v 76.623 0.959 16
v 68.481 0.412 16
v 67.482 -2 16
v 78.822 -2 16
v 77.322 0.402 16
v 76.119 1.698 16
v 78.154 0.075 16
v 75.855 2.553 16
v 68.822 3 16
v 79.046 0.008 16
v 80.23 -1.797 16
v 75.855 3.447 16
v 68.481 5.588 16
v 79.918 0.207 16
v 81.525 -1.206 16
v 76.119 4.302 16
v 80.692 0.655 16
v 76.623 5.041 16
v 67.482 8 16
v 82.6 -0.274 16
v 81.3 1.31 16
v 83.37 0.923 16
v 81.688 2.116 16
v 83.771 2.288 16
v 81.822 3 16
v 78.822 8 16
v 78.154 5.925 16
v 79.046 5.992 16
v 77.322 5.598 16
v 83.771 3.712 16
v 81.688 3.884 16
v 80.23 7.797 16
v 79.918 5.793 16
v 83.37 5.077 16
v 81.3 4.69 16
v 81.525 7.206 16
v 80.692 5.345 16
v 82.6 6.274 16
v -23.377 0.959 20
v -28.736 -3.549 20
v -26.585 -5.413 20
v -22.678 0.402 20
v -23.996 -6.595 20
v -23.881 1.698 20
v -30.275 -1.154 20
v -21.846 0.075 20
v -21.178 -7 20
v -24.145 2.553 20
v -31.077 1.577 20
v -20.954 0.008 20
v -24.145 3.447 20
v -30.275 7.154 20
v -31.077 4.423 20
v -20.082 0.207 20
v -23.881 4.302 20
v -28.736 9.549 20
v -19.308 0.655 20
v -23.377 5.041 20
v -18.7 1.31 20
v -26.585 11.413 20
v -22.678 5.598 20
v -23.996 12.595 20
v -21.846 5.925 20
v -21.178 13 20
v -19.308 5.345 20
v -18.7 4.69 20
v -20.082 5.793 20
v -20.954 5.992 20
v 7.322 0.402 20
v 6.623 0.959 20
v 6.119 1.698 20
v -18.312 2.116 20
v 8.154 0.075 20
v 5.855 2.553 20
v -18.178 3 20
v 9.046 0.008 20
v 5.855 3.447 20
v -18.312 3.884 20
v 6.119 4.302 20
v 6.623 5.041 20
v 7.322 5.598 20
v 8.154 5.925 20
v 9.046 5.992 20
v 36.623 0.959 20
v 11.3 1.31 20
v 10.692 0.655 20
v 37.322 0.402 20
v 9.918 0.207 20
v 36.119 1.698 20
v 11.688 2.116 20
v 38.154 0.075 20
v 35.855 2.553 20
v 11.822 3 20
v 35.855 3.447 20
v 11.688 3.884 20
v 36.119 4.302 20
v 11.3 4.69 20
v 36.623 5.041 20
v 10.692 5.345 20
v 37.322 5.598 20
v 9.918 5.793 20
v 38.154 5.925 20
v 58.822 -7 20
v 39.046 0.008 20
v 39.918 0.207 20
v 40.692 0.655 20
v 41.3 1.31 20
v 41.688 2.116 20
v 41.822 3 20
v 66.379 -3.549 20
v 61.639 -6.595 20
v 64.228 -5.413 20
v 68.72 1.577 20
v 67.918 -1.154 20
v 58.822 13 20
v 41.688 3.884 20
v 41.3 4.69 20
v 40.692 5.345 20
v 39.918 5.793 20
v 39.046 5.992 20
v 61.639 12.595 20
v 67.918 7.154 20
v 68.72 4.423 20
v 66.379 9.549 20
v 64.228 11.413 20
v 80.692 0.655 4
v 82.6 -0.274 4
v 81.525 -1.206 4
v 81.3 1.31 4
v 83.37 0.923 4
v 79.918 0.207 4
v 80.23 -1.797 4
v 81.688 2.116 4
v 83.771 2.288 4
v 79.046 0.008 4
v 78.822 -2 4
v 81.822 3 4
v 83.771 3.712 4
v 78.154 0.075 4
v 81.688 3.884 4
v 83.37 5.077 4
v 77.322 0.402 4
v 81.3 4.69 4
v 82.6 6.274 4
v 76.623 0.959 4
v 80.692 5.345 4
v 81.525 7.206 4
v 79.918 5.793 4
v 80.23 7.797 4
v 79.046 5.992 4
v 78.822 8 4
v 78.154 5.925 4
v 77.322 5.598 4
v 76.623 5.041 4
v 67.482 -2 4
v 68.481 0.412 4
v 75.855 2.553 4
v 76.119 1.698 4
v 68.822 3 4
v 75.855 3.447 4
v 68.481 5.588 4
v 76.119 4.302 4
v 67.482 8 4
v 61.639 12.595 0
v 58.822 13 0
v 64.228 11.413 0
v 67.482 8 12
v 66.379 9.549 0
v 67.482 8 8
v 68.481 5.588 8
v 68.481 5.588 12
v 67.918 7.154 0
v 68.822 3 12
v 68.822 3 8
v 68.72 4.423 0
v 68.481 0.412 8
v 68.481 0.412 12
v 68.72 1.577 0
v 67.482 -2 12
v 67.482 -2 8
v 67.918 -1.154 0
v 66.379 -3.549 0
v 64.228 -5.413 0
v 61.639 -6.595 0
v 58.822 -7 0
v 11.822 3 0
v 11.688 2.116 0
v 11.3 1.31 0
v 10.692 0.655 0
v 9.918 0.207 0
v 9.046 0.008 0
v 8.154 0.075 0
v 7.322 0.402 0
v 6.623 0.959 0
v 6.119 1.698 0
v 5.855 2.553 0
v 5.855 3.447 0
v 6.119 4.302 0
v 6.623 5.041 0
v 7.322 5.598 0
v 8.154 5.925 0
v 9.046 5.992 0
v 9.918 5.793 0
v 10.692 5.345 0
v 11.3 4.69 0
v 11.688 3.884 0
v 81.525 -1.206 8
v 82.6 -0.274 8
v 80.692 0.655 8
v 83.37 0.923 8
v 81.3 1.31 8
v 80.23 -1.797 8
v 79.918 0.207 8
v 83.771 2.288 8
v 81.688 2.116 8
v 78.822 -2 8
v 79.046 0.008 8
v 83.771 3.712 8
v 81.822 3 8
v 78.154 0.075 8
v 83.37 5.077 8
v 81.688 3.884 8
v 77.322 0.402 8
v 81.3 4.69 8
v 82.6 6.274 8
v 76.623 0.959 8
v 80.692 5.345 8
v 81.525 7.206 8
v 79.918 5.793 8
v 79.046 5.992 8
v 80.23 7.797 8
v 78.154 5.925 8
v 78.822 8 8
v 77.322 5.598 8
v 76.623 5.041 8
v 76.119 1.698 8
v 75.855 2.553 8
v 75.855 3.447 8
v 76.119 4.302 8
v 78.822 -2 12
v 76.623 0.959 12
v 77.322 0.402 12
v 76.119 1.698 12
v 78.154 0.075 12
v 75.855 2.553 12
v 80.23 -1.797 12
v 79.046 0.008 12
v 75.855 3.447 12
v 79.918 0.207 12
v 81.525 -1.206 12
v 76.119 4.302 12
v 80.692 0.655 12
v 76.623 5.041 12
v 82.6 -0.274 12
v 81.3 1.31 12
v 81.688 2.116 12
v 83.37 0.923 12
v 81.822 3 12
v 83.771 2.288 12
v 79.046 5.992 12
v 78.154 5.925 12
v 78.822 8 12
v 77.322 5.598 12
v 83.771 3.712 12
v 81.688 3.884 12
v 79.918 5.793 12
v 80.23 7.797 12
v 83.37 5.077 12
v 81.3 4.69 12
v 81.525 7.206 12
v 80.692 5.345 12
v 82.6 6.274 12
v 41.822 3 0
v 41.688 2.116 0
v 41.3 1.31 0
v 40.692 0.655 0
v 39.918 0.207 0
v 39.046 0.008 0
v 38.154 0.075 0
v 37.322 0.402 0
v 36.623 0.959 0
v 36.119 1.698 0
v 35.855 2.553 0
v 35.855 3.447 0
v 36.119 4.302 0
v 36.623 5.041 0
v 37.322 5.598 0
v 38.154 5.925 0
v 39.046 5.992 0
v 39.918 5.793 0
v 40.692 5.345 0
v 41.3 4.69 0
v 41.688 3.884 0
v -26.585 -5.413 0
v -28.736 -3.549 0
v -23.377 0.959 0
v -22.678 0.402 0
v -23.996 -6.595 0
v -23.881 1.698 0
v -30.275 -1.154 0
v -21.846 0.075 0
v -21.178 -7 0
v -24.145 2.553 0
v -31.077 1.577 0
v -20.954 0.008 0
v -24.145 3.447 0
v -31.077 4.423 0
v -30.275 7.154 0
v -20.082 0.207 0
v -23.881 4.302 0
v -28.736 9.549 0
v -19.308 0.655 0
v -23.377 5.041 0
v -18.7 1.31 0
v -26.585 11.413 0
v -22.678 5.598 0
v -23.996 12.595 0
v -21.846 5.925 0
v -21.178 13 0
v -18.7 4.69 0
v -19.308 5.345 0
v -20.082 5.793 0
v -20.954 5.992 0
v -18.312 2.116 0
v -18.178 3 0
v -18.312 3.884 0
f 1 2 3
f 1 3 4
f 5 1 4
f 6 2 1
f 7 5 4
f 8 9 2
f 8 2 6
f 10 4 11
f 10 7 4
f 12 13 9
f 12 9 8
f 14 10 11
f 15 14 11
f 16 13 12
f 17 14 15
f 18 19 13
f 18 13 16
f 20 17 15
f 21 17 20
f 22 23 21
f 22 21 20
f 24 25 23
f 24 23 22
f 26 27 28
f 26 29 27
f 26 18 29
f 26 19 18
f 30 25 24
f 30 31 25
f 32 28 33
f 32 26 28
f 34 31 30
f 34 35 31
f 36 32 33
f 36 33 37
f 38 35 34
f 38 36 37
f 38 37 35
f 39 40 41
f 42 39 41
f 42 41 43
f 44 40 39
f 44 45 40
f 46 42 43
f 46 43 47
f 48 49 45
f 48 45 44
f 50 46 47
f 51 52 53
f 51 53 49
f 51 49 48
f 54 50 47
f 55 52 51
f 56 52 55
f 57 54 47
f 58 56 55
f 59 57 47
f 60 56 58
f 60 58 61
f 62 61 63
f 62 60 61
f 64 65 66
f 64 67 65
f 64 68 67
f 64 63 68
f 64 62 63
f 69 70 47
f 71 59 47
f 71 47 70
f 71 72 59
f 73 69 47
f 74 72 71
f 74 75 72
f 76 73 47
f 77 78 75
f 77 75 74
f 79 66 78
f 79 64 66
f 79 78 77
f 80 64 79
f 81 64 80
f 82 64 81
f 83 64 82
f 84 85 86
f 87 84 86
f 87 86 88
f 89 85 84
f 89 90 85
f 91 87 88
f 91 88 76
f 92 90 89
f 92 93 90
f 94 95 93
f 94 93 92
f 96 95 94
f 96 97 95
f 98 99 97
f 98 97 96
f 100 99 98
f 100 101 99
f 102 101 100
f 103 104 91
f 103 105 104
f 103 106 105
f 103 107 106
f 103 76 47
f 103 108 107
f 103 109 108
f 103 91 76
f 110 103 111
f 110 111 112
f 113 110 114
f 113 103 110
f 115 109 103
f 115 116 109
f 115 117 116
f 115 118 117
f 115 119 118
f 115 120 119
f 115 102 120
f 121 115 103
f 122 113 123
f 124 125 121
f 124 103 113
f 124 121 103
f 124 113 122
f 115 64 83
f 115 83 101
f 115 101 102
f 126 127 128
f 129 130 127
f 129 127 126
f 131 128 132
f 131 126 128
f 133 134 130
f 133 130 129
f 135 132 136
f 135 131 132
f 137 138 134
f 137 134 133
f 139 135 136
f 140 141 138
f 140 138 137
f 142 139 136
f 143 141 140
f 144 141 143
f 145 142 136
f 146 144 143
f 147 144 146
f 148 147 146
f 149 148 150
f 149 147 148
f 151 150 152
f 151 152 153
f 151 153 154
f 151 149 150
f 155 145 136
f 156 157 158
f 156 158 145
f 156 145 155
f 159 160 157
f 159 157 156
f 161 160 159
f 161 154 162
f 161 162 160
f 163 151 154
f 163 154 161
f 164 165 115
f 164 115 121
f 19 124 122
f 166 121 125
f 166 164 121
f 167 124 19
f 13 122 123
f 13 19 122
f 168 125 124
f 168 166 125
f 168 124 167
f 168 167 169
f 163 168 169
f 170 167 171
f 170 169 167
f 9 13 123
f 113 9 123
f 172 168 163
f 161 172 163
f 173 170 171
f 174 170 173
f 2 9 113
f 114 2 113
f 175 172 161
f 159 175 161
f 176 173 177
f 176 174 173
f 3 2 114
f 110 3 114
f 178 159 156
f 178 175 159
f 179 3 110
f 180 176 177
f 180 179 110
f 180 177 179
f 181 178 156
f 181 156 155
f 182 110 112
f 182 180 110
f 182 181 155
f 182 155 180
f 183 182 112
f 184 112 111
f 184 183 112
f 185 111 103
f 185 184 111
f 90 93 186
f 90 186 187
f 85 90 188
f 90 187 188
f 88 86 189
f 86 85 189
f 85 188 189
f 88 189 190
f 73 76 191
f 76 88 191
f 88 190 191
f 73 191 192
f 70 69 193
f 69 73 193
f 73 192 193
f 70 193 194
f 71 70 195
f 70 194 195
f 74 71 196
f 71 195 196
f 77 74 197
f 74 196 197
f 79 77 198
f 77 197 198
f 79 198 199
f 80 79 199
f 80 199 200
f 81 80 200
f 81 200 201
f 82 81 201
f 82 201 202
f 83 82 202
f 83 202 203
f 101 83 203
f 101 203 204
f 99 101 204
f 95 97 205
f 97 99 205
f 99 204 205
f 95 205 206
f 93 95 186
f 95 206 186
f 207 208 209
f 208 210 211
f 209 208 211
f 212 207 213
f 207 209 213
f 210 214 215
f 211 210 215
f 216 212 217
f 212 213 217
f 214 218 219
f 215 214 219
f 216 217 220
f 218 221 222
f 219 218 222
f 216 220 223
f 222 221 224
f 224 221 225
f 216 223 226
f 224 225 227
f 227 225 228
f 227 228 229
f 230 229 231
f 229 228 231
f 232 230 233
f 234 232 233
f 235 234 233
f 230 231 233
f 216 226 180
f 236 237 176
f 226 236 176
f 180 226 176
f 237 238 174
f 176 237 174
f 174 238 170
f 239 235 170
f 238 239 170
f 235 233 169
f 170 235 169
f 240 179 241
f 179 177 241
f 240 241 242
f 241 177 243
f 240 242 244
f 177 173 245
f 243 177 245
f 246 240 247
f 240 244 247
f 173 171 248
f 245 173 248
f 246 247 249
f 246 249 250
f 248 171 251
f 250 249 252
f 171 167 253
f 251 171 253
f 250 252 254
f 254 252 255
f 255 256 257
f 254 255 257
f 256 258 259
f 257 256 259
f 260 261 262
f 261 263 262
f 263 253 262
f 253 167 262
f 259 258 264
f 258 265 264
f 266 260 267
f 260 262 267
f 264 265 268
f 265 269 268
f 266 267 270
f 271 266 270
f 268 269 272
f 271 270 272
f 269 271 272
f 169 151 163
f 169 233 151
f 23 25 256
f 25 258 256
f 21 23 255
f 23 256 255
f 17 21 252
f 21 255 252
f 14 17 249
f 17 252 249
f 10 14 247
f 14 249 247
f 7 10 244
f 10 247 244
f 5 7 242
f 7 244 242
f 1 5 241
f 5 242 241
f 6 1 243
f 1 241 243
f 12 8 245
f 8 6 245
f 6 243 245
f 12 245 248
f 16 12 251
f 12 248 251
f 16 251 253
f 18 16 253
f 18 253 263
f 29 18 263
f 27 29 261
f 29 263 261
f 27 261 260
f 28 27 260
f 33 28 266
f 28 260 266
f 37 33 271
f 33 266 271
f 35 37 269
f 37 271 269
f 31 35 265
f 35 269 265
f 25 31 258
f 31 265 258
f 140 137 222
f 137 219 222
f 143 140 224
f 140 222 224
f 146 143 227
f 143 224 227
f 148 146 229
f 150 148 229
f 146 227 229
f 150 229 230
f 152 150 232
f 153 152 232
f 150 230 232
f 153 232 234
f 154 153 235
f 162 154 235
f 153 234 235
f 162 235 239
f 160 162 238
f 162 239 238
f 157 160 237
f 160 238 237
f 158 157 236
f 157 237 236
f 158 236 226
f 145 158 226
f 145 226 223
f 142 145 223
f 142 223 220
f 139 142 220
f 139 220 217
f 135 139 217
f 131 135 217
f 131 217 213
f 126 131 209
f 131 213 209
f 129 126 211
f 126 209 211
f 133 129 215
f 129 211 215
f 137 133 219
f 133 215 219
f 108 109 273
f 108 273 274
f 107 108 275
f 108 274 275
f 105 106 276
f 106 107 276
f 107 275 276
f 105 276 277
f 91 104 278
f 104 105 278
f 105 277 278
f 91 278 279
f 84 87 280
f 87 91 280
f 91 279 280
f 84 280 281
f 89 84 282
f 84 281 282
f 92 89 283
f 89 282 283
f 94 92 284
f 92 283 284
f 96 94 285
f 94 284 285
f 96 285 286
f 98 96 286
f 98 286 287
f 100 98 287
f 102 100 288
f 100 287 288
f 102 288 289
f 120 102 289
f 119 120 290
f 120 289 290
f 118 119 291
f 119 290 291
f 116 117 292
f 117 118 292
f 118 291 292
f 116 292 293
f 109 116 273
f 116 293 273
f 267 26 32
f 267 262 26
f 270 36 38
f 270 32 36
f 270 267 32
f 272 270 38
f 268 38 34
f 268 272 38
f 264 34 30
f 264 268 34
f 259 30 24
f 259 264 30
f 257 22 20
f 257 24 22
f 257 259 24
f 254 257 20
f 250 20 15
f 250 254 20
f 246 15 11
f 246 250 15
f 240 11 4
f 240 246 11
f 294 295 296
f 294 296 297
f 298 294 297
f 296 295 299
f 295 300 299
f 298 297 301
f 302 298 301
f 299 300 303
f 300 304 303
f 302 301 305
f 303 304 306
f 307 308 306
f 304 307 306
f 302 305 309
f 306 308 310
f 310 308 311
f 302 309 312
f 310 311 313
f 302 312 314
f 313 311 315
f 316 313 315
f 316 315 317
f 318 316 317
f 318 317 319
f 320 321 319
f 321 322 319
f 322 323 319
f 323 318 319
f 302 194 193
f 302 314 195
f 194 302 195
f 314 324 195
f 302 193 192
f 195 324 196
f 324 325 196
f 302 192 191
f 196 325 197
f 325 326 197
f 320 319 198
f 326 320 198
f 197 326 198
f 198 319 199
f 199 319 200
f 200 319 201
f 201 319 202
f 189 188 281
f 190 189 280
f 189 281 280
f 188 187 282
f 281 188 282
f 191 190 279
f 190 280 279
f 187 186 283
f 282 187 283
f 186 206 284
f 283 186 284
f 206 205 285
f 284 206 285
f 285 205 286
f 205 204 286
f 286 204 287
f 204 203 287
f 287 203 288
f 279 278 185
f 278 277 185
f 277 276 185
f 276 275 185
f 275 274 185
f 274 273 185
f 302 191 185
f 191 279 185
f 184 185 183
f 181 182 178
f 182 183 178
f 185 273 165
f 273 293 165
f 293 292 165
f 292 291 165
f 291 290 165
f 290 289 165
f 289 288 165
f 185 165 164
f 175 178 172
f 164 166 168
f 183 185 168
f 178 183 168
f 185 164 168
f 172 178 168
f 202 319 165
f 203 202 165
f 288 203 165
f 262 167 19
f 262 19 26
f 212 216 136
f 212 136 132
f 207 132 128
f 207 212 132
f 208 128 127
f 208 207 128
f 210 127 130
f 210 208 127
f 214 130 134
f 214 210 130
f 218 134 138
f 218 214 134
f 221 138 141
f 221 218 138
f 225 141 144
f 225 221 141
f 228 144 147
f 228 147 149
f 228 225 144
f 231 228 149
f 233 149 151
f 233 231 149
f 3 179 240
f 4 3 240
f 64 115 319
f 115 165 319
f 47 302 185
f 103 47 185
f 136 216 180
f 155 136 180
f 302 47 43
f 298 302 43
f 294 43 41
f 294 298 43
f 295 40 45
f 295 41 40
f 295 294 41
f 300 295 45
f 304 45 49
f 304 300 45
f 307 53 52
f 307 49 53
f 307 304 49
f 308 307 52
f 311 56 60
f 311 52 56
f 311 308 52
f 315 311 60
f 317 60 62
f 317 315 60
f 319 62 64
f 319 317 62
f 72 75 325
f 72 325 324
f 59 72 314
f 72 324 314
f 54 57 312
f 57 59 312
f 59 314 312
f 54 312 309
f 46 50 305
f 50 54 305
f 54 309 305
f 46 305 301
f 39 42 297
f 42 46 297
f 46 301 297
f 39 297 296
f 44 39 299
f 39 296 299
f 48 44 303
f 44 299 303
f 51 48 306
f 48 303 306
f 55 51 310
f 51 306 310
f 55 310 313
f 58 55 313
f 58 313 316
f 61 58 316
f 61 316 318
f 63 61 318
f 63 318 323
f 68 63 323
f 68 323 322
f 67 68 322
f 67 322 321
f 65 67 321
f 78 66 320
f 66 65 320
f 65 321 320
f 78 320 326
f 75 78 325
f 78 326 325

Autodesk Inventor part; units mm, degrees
ref_plane "YZ Plane" through (0, 0, 0) normal (1, 0, 0) x (0, 1, 0)
sketch "Sketch1" plane through (0, 0, 0) normal (0, 0, 1) x (1, 0, 0)
  line L0 (-21.1783, 3) -> (58.8217, 3) construction
  line L1 (-21.1783, -7) -> (58.8217, -7)
  line L2 (58.8217, 13) -> (-21.1783, 13)
  arc A0 (-21.1783, 13) -> (-21.1783, -7) centre (-21.1783, 3) ccw
  arc A1 (58.8217, -7) -> (58.8217, 13) centre (58.8217, 3) ccw
  line L3 (67.482, 8) -> (78.8217, 8)
  arc A2 (78.8217, -2) -> (78.8217, 8) centre (78.8217, 3) ccw
  line L4 (67.482, -2) -> (78.8217, -2)
  circle A3 centre (78.8217, 3) radius 3
  circle A4 centre (8.8217, 3) radius 3
  circle A5 centre (38.8217, 3) radius 3
  circle A6 centre (-21.1783, 3) radius 3
  point P0 (0, 0)
  dimension "d0" = 20
  dimension "d18" = 10
  dimension "d19" = 20
  dimension "d21" = 6
  dimension "d29" = 30
  dimension "d31" = 30
extrude "Extrusion1" add sketch "Sketch1" along normal blind 20 contours A0 L2 A1 L1
ref_plane "Work Plane5" through (0, 0, 12) normal (0, 0, 1) x (1, 0, 0)
ref_plane "Work Plane4" through (0, 0, 10) normal (0, 0, 1) x (1, 0, 0)
sketch "Sketch4" plane through (0, 0, 12) normal (0, 0, 1) x (1, 0, 0)
  line L0 (67.482, 8) -> (78.8217, 8) projected
  line L1 (67.482, -2) -> (78.8217, -2) projected
  arc A0 (78.8217, -2) -> (78.8217, 8) centre (78.8217, 3) ccw projected
  circle A1 centre (78.8217, 3) radius 3 projected
  arc A2 (58.8217, -7) -> (58.8217, 13) centre (58.8217, 3) ccw projected
  point P0 (0, 0)
extrude "Extrusion4" add sketch "Sketch4" along normal blind 4
ref_plane "Work Plane6" through (0, 0, 10) normal (0, 0, 1) x (1, 0, 0)
mirror "Mirror2" about plane through (0, 0, 10) normal (0, 0, 1) of "Extrusion4"
equation "\"d18\" = R"
equation "\"d21\" = r"
equation "\"d6\" = w"
equation "\"d22\" = 0.2 * w"
equation "\"r\" = 6"
equation "\"d3\" = 6"
equation "\"d5\" = 6"
equation "\"th\" = 5"
equation "\"R\" = 10"
equation "\"w\" = 20"
equation "\"d20\" = 0.1 * w"
equation "\"d25\" = 6"
